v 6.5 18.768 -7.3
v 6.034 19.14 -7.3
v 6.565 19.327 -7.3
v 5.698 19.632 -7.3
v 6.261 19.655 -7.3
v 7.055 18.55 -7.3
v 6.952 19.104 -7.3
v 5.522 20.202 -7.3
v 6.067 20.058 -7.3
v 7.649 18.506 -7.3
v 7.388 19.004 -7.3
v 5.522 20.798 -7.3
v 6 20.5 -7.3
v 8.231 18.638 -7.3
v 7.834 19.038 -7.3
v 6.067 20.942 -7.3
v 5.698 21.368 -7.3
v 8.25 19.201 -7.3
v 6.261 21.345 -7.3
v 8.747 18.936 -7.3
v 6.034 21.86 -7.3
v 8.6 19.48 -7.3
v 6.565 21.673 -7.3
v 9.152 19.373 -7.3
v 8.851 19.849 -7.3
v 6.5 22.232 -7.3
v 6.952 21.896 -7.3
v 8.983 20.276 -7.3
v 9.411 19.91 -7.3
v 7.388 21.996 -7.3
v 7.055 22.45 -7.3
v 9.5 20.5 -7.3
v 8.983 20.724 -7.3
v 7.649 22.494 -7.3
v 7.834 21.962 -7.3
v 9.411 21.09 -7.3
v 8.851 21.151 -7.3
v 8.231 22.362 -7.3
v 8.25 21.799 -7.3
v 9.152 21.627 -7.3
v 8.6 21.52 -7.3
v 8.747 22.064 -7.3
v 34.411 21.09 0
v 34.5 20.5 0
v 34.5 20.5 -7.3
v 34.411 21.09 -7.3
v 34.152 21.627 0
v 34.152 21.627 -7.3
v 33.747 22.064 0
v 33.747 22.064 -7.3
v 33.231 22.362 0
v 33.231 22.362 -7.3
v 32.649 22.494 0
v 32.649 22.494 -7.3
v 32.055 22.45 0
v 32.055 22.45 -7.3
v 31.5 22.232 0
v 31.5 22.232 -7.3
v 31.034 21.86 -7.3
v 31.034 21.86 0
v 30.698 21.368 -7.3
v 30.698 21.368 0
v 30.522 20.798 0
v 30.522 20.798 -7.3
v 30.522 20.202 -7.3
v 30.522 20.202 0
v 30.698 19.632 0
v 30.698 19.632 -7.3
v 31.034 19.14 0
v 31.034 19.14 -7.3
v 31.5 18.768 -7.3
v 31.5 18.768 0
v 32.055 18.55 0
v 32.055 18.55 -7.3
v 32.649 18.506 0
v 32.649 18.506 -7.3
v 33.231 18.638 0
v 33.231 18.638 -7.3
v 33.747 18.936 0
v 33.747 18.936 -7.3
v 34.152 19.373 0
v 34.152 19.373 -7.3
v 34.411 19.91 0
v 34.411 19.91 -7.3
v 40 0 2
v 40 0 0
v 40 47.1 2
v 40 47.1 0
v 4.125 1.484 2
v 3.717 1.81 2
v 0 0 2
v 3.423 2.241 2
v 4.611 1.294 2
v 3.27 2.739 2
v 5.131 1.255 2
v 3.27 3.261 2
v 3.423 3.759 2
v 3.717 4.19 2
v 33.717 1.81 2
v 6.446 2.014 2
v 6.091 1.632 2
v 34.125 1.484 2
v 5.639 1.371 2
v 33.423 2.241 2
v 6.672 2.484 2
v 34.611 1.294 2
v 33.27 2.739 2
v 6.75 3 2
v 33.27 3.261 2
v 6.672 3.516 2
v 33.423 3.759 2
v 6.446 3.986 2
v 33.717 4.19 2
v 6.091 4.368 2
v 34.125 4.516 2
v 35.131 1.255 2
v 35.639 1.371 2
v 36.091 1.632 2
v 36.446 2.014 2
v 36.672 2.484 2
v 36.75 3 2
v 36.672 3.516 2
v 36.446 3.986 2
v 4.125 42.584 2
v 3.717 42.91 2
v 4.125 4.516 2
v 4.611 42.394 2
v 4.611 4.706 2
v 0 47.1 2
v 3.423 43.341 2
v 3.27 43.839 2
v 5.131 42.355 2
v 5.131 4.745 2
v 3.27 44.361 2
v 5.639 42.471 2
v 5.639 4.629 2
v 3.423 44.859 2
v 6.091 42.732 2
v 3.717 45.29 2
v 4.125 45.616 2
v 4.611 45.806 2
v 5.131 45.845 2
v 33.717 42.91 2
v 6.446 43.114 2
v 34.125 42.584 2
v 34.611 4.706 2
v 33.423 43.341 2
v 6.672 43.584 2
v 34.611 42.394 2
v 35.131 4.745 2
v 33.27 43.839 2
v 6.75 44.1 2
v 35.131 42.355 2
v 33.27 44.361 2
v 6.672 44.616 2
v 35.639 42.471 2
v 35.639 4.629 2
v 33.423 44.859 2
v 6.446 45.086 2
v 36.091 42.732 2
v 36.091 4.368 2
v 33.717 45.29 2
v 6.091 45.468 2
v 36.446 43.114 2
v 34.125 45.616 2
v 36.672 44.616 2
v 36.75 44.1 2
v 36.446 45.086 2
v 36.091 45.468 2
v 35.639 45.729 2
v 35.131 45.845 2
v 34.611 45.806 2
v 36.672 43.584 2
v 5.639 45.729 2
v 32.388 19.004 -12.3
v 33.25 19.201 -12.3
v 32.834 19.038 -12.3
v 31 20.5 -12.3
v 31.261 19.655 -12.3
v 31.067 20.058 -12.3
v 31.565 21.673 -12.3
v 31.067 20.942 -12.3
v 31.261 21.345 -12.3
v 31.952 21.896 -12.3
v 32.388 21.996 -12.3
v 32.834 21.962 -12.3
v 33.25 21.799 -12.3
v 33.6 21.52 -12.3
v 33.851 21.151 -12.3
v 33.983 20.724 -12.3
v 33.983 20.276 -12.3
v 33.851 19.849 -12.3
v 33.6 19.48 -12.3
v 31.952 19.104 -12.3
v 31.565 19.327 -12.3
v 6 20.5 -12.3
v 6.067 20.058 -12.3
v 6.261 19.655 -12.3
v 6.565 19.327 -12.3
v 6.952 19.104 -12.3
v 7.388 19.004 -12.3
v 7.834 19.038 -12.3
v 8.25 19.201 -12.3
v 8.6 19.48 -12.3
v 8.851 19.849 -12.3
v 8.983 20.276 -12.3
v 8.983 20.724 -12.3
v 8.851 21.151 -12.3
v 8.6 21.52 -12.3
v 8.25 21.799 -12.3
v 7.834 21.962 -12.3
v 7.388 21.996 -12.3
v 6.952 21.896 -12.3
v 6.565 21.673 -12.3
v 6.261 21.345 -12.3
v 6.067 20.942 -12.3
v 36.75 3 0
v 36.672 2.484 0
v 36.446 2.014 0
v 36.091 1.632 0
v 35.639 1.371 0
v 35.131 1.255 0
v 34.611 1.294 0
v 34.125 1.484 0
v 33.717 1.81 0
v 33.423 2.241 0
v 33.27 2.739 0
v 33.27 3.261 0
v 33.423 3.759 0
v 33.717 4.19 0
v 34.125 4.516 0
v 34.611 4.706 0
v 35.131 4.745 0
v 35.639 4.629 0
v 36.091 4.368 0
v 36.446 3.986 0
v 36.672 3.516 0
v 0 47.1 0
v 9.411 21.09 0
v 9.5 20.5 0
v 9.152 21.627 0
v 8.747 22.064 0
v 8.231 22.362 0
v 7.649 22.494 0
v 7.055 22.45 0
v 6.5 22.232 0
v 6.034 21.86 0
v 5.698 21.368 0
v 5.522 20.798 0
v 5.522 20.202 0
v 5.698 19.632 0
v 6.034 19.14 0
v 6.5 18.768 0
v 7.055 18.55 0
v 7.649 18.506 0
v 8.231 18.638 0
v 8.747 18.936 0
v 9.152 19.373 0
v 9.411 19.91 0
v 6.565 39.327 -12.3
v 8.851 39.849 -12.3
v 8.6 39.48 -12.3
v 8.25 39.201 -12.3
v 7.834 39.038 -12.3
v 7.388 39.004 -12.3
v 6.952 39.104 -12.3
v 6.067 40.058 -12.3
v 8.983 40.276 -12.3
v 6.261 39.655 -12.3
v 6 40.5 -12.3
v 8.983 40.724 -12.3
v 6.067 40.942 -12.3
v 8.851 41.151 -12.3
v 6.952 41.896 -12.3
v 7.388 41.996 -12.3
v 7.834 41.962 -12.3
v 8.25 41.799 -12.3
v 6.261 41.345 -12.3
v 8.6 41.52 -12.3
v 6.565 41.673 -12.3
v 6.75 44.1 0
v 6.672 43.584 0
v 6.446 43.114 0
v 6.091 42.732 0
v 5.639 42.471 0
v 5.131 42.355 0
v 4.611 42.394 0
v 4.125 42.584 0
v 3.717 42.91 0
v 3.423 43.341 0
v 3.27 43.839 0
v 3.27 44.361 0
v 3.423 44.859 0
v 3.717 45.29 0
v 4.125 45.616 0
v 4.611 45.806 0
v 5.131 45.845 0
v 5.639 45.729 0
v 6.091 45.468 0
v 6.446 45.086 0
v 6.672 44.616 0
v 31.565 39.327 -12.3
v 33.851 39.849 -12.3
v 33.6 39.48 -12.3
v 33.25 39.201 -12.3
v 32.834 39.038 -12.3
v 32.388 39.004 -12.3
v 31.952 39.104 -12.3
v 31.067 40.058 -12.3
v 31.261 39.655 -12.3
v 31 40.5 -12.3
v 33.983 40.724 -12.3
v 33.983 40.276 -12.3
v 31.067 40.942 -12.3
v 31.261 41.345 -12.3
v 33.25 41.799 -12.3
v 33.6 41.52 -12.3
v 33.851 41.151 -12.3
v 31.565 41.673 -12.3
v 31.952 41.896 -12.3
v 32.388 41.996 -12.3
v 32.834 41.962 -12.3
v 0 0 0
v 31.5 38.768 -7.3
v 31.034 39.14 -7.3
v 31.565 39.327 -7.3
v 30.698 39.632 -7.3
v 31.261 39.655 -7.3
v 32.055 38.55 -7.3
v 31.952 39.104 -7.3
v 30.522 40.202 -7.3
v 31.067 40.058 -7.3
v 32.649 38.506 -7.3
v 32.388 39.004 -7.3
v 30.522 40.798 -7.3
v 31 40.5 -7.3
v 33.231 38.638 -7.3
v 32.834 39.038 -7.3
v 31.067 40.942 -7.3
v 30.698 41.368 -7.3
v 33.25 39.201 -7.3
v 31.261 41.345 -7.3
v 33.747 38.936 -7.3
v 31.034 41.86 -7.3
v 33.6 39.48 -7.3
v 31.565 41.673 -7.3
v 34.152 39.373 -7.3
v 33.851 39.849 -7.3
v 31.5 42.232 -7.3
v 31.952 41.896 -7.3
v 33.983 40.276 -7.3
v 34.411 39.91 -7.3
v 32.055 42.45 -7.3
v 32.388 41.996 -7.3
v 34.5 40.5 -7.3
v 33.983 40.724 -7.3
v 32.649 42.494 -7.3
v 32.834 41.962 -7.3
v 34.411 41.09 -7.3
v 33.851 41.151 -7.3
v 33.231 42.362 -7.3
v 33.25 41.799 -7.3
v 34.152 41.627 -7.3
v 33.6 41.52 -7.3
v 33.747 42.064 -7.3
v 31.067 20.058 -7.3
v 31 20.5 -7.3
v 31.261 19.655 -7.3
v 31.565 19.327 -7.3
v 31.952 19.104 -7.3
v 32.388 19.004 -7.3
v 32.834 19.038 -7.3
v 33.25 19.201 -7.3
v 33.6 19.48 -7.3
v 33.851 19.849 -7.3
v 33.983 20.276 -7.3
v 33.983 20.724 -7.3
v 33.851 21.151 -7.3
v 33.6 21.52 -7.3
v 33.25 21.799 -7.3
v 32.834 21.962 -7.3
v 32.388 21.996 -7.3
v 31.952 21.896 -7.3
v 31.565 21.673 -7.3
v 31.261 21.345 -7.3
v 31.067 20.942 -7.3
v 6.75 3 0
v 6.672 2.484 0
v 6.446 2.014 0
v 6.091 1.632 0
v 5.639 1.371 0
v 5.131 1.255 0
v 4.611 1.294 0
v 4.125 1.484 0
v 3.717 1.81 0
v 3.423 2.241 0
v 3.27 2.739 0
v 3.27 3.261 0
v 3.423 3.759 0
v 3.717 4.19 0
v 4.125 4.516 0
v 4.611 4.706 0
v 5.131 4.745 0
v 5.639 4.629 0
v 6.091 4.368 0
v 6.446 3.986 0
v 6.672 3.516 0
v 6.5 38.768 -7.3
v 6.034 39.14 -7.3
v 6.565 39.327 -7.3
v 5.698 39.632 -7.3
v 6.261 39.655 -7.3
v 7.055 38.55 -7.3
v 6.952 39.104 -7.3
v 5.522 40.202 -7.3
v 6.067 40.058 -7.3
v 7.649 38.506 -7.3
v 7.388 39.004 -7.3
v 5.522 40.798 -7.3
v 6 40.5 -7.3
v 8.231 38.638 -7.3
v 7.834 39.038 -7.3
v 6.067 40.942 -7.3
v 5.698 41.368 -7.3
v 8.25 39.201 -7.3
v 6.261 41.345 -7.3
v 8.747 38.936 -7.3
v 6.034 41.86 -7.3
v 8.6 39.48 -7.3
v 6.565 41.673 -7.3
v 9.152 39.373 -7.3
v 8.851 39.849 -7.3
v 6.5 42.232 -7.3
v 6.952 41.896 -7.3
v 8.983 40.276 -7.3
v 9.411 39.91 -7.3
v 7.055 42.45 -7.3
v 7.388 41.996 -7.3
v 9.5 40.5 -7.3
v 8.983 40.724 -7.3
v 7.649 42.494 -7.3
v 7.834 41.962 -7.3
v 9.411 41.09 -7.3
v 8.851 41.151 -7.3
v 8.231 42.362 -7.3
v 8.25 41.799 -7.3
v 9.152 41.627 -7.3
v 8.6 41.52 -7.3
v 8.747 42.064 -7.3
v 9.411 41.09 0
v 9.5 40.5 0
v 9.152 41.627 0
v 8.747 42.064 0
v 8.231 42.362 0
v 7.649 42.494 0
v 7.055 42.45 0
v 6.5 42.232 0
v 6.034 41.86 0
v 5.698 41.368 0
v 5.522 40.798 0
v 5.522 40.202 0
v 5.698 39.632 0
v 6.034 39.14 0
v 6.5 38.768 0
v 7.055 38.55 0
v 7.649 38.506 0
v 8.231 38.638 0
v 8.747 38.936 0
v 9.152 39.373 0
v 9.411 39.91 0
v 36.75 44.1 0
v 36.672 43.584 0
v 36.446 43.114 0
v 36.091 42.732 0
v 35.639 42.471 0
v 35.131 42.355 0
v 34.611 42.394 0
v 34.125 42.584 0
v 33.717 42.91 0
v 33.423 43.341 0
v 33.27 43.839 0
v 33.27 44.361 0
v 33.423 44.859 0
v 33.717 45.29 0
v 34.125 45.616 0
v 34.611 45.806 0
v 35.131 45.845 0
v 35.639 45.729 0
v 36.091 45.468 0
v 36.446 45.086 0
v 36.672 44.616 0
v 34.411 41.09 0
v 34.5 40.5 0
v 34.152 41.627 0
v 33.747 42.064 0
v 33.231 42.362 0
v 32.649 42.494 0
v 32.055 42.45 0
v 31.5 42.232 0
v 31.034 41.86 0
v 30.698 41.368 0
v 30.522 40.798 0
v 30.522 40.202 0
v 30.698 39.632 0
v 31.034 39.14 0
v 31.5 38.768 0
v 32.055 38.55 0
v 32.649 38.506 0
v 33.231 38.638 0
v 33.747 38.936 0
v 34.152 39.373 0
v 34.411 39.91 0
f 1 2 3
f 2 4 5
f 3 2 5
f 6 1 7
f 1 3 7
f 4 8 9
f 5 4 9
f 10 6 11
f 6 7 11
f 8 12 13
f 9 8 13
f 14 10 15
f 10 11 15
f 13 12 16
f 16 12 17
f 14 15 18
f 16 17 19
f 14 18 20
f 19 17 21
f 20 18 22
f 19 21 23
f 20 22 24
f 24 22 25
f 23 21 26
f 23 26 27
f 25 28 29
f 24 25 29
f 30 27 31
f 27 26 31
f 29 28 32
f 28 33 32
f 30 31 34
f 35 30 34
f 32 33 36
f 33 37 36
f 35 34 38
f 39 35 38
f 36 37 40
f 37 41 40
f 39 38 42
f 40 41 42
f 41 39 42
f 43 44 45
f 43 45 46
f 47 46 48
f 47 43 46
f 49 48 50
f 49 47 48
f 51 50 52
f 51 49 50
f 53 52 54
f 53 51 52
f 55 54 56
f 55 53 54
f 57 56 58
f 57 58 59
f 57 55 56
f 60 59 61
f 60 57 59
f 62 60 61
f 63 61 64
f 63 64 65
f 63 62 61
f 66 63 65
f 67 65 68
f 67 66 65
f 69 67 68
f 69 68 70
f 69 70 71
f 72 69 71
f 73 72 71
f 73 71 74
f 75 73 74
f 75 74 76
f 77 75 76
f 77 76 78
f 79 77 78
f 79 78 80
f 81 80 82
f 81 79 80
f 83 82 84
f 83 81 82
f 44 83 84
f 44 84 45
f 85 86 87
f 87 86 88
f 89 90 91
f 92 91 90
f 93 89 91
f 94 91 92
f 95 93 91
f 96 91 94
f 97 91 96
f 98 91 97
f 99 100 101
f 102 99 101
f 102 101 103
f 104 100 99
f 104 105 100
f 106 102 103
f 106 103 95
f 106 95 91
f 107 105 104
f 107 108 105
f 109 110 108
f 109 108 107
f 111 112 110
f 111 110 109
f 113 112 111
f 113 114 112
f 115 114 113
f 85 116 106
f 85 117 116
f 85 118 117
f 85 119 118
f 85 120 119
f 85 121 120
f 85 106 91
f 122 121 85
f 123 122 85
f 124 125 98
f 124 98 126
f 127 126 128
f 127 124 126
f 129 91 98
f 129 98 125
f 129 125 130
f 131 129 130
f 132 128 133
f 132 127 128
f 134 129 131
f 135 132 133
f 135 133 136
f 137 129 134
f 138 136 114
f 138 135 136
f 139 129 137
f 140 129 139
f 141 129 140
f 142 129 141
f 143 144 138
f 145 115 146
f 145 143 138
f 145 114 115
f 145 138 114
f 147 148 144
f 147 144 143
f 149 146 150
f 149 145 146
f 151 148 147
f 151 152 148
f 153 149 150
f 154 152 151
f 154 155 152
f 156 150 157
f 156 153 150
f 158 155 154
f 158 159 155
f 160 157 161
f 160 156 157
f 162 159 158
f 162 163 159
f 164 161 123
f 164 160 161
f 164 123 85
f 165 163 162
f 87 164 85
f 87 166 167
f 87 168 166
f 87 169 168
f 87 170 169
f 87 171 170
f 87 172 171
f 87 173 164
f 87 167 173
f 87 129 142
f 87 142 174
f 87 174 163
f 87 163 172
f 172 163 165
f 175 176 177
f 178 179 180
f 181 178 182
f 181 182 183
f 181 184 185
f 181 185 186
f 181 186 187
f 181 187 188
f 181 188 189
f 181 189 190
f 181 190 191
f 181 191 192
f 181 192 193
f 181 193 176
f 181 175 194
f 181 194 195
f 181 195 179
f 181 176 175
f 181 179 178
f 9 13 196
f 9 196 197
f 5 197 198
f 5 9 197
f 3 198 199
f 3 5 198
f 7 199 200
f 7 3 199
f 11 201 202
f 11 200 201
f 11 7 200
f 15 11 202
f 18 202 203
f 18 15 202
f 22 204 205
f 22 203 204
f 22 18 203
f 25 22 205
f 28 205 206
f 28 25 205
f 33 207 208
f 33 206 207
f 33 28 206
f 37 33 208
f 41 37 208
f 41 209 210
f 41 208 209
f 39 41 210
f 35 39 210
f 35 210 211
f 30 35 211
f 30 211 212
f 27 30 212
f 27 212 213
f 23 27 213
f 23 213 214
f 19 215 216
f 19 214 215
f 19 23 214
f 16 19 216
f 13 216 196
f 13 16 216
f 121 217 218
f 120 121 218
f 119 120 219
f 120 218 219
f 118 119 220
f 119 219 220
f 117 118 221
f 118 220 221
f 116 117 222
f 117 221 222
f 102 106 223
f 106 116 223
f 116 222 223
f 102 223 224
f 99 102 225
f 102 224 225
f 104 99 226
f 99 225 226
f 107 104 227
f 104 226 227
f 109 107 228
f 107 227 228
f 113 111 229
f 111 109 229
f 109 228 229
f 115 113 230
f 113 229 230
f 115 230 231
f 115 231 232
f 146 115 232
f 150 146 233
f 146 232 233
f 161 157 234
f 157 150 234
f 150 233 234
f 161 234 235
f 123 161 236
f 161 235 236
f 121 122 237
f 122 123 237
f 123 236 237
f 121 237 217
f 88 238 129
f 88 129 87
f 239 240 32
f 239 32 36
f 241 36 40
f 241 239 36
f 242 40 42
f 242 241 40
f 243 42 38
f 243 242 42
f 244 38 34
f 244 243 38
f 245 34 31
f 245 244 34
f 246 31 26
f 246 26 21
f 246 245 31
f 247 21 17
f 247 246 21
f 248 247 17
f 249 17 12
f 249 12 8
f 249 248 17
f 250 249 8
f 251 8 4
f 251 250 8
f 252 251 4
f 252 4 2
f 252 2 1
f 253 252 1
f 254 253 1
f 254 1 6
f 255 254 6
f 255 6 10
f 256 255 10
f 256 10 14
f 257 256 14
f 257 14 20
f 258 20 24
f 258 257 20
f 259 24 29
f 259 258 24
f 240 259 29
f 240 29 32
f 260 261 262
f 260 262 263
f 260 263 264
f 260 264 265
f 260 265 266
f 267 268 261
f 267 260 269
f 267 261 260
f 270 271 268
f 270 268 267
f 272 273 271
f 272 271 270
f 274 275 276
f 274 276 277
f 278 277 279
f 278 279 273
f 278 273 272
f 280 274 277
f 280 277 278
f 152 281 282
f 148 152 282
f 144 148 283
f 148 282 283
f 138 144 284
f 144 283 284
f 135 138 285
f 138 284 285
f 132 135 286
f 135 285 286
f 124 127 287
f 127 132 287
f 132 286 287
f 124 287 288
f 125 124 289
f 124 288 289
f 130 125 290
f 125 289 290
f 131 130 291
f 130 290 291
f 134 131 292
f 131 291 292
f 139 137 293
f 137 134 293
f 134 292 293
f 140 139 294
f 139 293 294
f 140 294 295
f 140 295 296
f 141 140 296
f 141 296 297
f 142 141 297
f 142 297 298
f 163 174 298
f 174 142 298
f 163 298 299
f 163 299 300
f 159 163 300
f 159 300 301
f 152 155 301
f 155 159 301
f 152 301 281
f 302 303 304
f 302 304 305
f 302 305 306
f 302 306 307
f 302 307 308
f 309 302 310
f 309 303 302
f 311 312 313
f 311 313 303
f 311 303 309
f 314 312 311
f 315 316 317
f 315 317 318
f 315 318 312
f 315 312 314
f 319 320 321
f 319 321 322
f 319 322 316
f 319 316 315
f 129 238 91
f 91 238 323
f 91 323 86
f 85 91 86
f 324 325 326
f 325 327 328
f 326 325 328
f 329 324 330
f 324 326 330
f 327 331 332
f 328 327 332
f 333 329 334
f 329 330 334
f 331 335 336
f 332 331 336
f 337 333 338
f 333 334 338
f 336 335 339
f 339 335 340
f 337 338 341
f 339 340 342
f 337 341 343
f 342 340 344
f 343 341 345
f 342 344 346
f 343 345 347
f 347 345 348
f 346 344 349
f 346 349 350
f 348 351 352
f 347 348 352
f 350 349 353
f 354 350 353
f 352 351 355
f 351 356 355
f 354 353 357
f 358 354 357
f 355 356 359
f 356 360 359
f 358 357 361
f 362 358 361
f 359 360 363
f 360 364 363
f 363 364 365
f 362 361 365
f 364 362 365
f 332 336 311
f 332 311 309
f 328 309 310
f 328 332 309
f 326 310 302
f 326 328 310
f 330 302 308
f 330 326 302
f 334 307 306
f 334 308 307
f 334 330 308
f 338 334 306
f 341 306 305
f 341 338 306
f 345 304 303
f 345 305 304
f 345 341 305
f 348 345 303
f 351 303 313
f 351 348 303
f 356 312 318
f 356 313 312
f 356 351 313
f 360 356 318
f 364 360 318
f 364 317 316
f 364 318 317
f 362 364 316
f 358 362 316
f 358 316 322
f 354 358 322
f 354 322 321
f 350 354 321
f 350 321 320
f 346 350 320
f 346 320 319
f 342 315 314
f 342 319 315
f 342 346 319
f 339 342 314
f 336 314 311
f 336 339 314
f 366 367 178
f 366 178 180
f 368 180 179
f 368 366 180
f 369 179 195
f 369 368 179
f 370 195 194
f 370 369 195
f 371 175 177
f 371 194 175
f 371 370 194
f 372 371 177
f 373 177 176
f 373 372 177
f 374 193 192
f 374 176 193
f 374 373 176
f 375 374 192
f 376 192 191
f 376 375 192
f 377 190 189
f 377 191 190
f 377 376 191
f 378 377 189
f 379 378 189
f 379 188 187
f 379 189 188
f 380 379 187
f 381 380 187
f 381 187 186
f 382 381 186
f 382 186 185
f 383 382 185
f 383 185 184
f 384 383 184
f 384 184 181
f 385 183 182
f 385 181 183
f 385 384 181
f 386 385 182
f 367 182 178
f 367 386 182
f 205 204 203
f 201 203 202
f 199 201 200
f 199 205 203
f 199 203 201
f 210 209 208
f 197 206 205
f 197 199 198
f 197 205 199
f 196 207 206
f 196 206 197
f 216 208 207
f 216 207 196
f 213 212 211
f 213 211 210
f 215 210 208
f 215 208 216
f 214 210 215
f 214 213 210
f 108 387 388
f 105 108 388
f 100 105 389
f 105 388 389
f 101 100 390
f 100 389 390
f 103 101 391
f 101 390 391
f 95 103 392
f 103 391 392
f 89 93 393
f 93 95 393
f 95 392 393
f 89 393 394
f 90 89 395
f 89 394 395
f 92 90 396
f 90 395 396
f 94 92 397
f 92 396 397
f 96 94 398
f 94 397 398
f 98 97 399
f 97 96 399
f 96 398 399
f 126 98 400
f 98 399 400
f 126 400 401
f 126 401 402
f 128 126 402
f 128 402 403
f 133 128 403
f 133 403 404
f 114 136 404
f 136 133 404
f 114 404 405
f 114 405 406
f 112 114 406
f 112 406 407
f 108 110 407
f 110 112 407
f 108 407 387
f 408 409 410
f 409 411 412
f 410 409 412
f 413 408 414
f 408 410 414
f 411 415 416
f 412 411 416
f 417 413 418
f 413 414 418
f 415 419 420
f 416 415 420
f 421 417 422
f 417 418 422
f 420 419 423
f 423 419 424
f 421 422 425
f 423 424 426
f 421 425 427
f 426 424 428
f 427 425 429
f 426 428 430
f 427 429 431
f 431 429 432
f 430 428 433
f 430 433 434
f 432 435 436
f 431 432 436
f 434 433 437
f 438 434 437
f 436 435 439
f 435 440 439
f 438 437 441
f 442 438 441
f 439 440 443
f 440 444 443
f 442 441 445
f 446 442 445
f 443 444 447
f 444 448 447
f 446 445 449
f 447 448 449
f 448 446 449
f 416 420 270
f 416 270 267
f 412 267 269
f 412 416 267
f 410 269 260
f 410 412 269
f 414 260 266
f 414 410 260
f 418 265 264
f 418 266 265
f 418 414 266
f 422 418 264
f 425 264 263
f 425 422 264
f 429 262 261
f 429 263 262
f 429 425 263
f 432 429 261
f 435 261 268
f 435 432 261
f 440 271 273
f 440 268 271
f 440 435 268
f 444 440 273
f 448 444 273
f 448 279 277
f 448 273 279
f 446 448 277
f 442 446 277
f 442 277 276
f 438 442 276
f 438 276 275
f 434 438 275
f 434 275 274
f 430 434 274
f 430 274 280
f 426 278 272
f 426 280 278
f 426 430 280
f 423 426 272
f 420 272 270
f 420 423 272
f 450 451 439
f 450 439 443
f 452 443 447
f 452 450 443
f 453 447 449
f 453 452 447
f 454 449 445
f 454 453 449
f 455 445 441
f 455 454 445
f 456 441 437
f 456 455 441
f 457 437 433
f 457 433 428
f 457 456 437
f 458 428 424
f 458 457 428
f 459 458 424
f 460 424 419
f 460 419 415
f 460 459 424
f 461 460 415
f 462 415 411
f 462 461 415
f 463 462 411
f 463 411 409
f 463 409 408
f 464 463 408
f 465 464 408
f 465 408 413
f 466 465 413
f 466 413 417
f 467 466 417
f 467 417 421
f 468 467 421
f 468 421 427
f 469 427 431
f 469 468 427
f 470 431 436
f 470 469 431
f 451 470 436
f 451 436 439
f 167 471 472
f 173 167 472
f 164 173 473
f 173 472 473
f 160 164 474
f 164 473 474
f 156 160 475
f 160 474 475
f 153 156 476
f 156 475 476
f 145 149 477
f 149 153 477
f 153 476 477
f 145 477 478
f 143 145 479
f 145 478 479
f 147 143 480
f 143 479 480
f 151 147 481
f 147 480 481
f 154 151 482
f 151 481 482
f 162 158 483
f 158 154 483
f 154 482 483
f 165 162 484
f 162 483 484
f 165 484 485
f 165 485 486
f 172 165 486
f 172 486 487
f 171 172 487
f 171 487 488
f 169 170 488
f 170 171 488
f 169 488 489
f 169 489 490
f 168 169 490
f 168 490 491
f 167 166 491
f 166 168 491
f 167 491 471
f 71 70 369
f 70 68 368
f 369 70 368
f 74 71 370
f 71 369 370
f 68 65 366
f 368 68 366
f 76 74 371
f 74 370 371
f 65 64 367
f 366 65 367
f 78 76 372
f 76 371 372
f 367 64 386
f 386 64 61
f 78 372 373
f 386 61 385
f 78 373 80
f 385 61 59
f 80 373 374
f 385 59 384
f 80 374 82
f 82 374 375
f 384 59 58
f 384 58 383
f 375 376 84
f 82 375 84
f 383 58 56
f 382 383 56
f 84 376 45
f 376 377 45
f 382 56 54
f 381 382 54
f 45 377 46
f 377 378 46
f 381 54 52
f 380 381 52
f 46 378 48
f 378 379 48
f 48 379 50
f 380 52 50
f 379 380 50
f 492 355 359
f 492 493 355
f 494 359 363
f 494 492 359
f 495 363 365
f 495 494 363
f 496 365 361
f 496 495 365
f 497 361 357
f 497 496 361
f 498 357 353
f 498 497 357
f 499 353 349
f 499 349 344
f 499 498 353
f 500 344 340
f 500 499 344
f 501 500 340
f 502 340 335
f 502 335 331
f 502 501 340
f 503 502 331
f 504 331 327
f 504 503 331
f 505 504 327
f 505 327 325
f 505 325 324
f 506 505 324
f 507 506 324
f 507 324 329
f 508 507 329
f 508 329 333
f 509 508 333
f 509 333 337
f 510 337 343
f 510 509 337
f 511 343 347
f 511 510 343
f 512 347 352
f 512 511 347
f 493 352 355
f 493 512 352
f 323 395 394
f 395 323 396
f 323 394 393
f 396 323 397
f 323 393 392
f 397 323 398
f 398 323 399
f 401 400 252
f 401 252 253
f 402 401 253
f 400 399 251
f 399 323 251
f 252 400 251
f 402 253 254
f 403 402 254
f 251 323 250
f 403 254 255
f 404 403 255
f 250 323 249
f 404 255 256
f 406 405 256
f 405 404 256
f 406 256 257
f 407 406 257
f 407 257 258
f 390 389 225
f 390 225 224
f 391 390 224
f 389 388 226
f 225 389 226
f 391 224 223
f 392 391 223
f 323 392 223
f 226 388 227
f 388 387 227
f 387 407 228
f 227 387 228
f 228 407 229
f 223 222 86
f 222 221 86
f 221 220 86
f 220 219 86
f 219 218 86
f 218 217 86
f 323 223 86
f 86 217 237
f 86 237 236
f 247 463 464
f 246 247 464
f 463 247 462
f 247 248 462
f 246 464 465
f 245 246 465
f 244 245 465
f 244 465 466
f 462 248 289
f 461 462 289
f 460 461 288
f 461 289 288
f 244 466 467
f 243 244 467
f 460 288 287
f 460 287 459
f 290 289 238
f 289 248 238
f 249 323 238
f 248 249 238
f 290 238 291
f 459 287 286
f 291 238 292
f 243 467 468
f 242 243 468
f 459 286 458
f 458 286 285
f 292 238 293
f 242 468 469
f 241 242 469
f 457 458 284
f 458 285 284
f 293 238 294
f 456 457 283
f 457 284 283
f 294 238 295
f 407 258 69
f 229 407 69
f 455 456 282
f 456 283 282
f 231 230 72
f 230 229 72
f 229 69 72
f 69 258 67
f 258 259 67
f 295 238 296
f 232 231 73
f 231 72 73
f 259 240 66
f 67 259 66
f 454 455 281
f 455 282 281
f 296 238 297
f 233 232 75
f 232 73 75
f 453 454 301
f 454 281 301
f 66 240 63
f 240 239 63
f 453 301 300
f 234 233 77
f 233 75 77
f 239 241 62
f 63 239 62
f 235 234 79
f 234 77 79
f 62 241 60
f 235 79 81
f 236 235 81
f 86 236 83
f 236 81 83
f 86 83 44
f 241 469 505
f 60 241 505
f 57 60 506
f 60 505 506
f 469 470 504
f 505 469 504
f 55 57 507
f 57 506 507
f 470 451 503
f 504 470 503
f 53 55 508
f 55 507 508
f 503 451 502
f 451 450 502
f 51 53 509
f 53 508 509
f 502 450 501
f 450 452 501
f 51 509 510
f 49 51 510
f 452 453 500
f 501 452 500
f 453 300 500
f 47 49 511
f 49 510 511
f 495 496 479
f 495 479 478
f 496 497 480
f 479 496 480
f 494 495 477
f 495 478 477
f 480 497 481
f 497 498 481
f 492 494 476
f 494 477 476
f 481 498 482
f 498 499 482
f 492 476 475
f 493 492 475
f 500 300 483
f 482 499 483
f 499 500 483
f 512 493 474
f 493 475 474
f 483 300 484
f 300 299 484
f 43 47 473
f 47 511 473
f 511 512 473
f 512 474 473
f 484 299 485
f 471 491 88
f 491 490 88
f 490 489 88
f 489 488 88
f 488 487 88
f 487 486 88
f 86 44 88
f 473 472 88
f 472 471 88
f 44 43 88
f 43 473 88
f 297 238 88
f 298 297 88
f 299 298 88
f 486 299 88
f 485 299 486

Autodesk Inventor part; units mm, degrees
ref_plane "YZ Plane" through (0, 0, 0) normal (1, 0, 0) x (0, 1, 0)
ref_plane "XZ Plane" through (0, 0, 0) normal (0, 1, 0) x (-1, 0, 0)
ref_plane "XY Plane" through (0, 0, 0) normal (0, 0, 1) x (1, 0, 0)
sketch "Sketch1" plane through (0, 0, 0) normal (0, 0, 1) x (1, 0, 0)
  line L0 (0, 0) -> (40, 0)
  line L1 (40, 0) -> (40, 51)
  line L2 (40, 51) -> (0, 51)
  line L3 (0, 51) -> (0, 0)
  circle A0 centre (5, 3) radius 1.75
  circle A1 centre (12.5, 3) radius 1.75
  circle A2 centre (20, 3) radius 1.75
  circle A3 centre (27.5, 3) radius 1.75
  circle A4 centre (35, 3) radius 1.75
  line L4 (7.5, 20.5) -> (32.5, 20.5)
  line L5 (32.5, 20.5) -> (32.5, 40.5)
  line L6 (32.5, 40.5) -> (7.5, 40.5)
  line L7 (7.5, 40.5) -> (7.5, 20.5)
  line L8 (7.5, 20.5) -> (32.5, 40.5) construction
  line L9 (32.5, 20.5) -> (7.5, 40.5) construction
  circle A5 centre (32.5, 40.5) radius 2
  circle A6 centre (32.5, 20.5) radius 2
  circle A7 centre (7.5, 20.5) radius 2
  circle A8 centre (7.5, 40.5) radius 2
  circle A9 centre (35, 44.1) radius 1.75
  line L10 (0, 47.1) -> (40, 47.1)
  line L11 (40, 47.1) -> (40, 51)
  line L12 (40, 51) -> (0, 51)
  line L13 (0, 51) -> (0, 47.1)
  circle A10 centre (5, 44.1) radius 1.75
  point P0 (20, 51)
  point P1 (20, 30.5)
  point P2 (40, 25.5)
  point P3 (40, 47.1)
  dimension "d0" = 3.5
  dimension "d3" = 7.5
  dimension "d8" = 40
  dimension "d10" = 4
  dimension "d11" = 4
  dimension "d12" = 4
  dimension "d13" = 4
  dimension "d14" = 20
  dimension "d15" = 25
  dimension "d16" = 5
  dimension "d21" = 3
  dimension "d22" = 41.1
  dimension "d23" = 3
  dimension "d25" = 27.5
extrude "Extrusion1" add sketch "Sketch1" along normal blind 2 contours L3 L10 L1 L0 | A1 | A2 | A3 | L7 A7 L4 | L4 A7 L7 | A7 L7 A8 L6 A5 L5 A6 L4 | A6 L5 L4 | L4 L5 A6 | A8 L6 L7 | L7 L6 A8 | A5 L6 L5 | L5 L6 A5
extrude "Extrusion2" add sketch "Sketch1" against normal blind 7.3 contours L7 A7 L4 | L4 A7 L7 | A6 L5 L4 | L4 L5 A6 | A8 L6 L7 | L7 L6 A8 | A5 L6 L5 | L5 L6 A5
sketch "Sketch2" plane through (32.5, 20.5, -7.3) normal (0, 0, -1) x (-1, 0, 0)
  circle A0 centre (0, 20) radius 2 projected
  circle A1 centre (0, 0) radius 2 projected
  circle A2 centre (25, 20) radius 2 projected
  circle A3 centre (25, 0) radius 2 projected
  circle A4 centre (0, 20) radius 1.5
  circle A5 centre (0, 0) radius 1.5
  circle A6 centre (25, 0) radius 1.5
  circle A7 centre (25, 20) radius 1.5
  point P0 (32.5, -20.5)
  dimension "d26" = 3
  dimension "d27" = 3
  dimension "d28" = 3
  dimension "d29" = 3
extrude "Extrusion3" add sketch "Sketch2" along normal blind 5 contours A4 | A5 | A6 | A7
properties part number "HOLDER_MARKER_ROBOTAT" material "ABS Plastic"
